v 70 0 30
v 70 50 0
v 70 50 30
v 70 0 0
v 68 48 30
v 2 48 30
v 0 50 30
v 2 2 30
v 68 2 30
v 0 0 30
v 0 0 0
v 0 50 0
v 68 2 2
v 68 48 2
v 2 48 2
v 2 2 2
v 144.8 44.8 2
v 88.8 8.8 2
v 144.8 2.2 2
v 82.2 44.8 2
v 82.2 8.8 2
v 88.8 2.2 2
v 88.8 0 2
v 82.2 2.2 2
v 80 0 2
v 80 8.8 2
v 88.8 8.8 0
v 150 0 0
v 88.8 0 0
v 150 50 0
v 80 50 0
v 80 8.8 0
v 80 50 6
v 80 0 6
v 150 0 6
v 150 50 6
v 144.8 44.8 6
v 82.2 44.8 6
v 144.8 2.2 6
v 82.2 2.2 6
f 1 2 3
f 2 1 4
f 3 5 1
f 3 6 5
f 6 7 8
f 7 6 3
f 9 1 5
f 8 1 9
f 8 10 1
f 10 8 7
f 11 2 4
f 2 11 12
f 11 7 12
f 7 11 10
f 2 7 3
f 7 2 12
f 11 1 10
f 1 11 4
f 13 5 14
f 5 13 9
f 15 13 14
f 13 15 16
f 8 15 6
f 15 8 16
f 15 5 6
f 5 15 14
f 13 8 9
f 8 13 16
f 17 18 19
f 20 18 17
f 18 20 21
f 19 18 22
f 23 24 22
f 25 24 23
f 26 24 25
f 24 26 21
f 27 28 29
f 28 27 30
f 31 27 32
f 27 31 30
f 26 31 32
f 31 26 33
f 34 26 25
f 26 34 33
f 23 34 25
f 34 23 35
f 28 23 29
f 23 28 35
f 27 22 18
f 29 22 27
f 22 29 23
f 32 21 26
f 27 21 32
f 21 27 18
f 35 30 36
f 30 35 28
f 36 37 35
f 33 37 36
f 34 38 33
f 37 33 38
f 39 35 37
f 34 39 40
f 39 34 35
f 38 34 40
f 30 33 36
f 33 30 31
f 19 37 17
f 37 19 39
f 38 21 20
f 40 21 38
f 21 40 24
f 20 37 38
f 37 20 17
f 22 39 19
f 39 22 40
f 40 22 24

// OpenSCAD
// Two-part enclosure for small electronics board
// Part 1: Box (left)
// Part 2: Lid (right, printed upside down)
// Prints together with a 10 mm gap.

$fn = 64;

// --- Dimensions ---

// Part 1: Box
// Outer dimensions (X x Y x Z)
BOX_OUT_X = 70;
BOX_OUT_Y = 50;
BOX_OUT_Z = 30;
// Wall thicknesses
BOX_WALL_THICK = 2;
BOX_FLOOR_THICK = 2;

// Part 2: Lid
// Base plate dimensions
LID_PLATE_X = 70;
LID_PLATE_Y = 50;
LID_PLATE_THICK = 2;
// Lip dimensions (outer size of the lip)
LIP_OUT_X = 65.6;
LIP_OUT_Y = 45.6;
LIP_THICK = 1.5;
LIP_HEIGHT = 4;

// --- Layout ---
// Gap between parts
PART_GAP = 10;

// --- Part 1: The Box ---
// Position: Centered on origin in X, Y, Z=0.
// We build the floor and walls.
// We use difference to subtract the empty interior starting above the floor.

translate([0, 0, 0])
difference() {
    // 1. The solid block representing the outer volume
    cube([BOX_OUT_X, BOX_OUT_Y, BOX_OUT_Z], center = false);
    
    // 2. The empty interior to subtract
    // Inner dimensions:
    // X: 70 - 2*2 = 66
    // Y: 50 - 2*2 = 46
    // Z: Starts at BOX_FLOOR_THICK (2mm) and goes up to the top.
    translate([
        BOX_WALL_THICK, 
        BOX_WALL_THICK, 
        BOX_FLOOR_THICK // Start subtraction 2mm up from bed to leave the floor
    ])
    cube([
        BOX_OUT_X - (2 * BOX_WALL_THICK),
        BOX_OUT_Y - (2 * BOX_WALL_THICK),
        BOX_OUT_Z - BOX_FLOOR_THICK // Height of the empty space
    ]);
}

// --- Part 2: The Lid ---
// Position: On the +X side of the box.
// Box center X = 35. Box right edge = 70.
// Lid left edge = 70 + 10 = 80.
// Lid center X = 80 + (70/2) = 115.
// Lid is printed upside down: Plate on bed (Z=0), Lip on top.

translate([
    BOX_OUT_X + PART_GAP, 
    0, 
    0
])
difference() {
    // 1. The solid block representing the outer volume (Plate + Lip)
    // Total height = Plate(2) + Lip(4) = 6mm
    // We construct the union of the plate and the lip as one solid block first.
    // Outer envelope: 70 x 50 x 6
    cube([LID_PLATE_X, LID_PLATE_Y, LID_PLATE_THICK + LIP_HEIGHT], center = false);
    
    // 2. Subtract the voids to create the lip shape
    
    // Void 1: The inner cavity of the lip (Z=2 to Z=6)
    // Inner X = 65.6 - 2*1.5 = 62.6
    // Inner Y = 45.6 - 2*1.5 = 42.6
    translate([
        (LID_PLATE_X - LIP_OUT_X)/2, 
        (LID_PLATE_Y - LIP_OUT_Y)/2, 
        LID_PLATE_THICK // Start at top of plate
    ])
    cube([
        LIP_OUT_X - (2 * LIP_THICK),
        LIP_OUT_Y - (2 * LIP_THICK),
        LIP_HEIGHT
    ]);
    
    // Void 2: The space between the lip and the plate edges (Z=0 to Z=2)
    // This is the area of the plate that is outside the lip's footprint.
    // We need to subtract the corners of the plate that are not under the lip.
    // Lip footprint: 65.6 x 45.6. Plate: 70 x 50.
    // We create 4 corner blocks to subtract.
    
    // Calculate offsets for the corners
    // Plate half-size: 35 x 25
    // Lip half-size: 32.8 x 22.8
    // Corner width X = (35 - 32.8) = 2.2
    // Corner width Y = (25 - 22.8) = 2.2
    
    corner_x = (LID_PLATE_X - LIP_OUT_X) / 2;
    corner_y = (LID_PLATE_Y - LIP_OUT_Y) / 2;
    
    // Subtract the 4 corner regions of the plate (height 2mm)
    for (i = [0:1]) {
        for (j = [0:1]) {
            translate([
                j * (LID_PLATE_X - LIP_OUT_X),
                i * (LID_PLATE_Y - LIP_OUT_Y),
                0
            ])
            cube([
                LID_PLATE_X - LIP_OUT_X,
                LID_PLATE_Y - LIP_OUT_Y,
                LID_PLATE_THICK
            ]);
        }
    }
}
